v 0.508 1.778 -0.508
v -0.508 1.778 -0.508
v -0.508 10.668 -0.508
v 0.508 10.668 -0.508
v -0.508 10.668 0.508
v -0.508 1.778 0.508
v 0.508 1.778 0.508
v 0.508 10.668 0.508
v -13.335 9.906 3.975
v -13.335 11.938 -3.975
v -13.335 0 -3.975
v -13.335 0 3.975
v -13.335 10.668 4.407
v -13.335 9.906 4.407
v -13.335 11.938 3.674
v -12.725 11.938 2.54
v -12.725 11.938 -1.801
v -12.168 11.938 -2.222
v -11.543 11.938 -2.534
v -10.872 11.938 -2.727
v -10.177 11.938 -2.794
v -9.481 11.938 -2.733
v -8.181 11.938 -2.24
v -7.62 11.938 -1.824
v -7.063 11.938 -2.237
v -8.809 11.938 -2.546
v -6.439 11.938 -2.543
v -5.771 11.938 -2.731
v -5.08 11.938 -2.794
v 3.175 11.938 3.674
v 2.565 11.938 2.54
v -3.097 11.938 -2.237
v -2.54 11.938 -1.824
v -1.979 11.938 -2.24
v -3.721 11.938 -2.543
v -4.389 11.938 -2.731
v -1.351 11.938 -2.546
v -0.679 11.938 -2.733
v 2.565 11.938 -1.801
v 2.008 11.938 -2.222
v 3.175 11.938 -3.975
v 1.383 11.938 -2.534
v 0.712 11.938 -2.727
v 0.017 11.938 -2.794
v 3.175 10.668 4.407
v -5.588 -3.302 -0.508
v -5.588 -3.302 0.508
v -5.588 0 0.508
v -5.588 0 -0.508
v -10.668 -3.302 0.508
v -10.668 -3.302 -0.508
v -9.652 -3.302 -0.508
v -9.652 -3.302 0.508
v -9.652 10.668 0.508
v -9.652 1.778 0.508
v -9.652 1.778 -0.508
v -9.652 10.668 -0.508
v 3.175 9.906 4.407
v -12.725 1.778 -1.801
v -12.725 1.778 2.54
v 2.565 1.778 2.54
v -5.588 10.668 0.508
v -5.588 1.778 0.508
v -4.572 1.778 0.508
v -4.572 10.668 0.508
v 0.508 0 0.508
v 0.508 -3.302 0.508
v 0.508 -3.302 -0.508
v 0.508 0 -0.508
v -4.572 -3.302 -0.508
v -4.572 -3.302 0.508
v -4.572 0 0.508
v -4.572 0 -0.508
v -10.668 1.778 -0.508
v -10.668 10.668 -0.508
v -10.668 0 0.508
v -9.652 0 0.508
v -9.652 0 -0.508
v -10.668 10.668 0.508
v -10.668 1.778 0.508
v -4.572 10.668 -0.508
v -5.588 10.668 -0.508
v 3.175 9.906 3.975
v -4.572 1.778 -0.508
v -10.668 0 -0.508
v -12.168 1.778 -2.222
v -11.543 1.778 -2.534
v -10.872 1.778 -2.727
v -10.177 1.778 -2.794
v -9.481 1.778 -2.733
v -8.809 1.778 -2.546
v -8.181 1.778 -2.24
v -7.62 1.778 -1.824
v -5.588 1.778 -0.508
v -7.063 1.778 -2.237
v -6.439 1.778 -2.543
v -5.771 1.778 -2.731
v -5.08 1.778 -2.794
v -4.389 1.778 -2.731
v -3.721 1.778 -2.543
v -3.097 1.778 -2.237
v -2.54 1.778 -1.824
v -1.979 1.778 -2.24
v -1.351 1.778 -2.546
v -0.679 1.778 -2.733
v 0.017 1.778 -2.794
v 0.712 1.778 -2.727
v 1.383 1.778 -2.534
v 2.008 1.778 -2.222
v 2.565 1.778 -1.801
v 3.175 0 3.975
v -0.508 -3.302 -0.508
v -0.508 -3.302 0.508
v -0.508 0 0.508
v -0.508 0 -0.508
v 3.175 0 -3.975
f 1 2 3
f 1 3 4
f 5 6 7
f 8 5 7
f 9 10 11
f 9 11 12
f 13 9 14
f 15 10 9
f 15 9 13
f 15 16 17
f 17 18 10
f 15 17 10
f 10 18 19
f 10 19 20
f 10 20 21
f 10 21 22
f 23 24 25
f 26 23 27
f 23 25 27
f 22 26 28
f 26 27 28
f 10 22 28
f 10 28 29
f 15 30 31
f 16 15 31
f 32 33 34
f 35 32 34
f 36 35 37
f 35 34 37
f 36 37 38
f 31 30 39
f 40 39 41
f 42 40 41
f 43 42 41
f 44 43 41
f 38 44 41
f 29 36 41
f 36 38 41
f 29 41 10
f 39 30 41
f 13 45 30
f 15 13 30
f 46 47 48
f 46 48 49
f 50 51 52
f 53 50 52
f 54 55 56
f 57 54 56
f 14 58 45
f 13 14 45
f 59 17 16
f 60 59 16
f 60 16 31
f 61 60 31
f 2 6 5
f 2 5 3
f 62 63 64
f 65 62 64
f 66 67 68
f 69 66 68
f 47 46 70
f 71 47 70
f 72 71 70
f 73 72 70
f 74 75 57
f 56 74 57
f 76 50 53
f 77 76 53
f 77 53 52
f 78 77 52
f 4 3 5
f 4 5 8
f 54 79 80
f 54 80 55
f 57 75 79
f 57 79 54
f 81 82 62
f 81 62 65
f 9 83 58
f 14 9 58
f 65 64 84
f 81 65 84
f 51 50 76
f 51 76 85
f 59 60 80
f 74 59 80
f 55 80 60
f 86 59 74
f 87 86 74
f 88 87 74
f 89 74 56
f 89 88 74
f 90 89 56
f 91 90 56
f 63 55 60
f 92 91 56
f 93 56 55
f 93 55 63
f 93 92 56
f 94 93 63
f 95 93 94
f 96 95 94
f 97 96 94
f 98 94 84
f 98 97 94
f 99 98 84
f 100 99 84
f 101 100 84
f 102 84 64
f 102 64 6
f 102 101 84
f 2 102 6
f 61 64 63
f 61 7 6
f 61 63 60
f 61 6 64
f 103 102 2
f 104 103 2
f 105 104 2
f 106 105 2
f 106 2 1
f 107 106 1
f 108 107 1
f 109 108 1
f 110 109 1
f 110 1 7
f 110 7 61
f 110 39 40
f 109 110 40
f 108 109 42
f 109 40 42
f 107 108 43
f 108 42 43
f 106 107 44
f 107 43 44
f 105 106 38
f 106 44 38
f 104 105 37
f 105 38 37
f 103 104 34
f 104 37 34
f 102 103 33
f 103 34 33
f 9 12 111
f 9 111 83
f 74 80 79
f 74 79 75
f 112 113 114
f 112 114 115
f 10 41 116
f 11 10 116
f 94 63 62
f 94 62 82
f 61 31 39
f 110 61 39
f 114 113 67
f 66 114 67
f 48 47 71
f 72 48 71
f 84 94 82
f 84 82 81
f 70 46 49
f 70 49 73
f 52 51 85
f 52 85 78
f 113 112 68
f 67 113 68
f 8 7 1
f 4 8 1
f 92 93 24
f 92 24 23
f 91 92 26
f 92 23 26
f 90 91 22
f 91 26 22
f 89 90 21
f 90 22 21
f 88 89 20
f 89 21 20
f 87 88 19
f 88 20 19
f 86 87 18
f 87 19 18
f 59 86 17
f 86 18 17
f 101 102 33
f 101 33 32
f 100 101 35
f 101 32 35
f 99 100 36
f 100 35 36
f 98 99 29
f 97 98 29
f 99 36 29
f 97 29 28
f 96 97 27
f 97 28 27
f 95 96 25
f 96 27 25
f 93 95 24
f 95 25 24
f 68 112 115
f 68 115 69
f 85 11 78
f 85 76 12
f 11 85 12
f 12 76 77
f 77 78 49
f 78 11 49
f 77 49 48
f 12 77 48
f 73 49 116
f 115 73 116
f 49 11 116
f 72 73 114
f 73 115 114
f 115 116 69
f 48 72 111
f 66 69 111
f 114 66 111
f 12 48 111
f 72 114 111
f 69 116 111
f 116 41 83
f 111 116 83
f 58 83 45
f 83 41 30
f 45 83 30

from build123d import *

# Parameters (mm, degrees)
EXTRUDE1_DEPTH     = 16.51
CUT_EXTRUDE1_DEPTH = 10.16
EXTRUDE2_START     = -3.302
SKETCH2_W          = 1.016
SKETCH2_H          = 1.016
EXTRUDE2_DEPTH     = 13.97
LPATTERN1_COUNT    = 3
LPATTERN1_PITCH    = 5.08


with BuildPart() as part:
    # Sketch1 → Extrude1 (new body)
    with BuildSketch(Plane(origin=(3.175, 0, 0), x_dir=(0, 0, -1), z_dir=(1, 0, 0))):
        Polygon((-3.9751, 0), (-3.9751, 9.906), (-4.4069, 9.906), (-4.4069, 10.668), (-3.673665158, 11.938), (3.9751, 11.938), (3.9751, 0), align=None)
    extrude(amount=-EXTRUDE1_DEPTH)

    # Sketch3 → Cut-Extrude1 (cut)
    with BuildSketch(Plane(origin=(0, 11.938, 0), x_dir=(1, 0, 0), z_dir=(0, 1, 0))):
        with BuildLine():
            Line((-2.5654, 1.800881758), (-2.5654, -2.54))
            Line((-2.5654, -2.54), (2.5654, -2.54))
            Line((2.5654, -2.54), (2.5654, 1.800881758))
            ThreePointArc((2.5654, 1.800881758), (0, 2.794), (-2.5654, 1.800881758))
        make_face()
    cut_extrude1 = extrude(amount=-CUT_EXTRUDE1_DEPTH, mode=Mode.SUBTRACT)

    # Sketch2 → Extrude2 (add)
    with BuildSketch(Plane(origin=(0, 0, 0), x_dir=(1, 0, 0), z_dir=(0, 1, 0)).offset(EXTRUDE2_START)):
        Rectangle(SKETCH2_W, SKETCH2_H)
    extrude2 = extrude(amount=EXTRUDE2_DEPTH)

    # LPattern1: Cut-Extrude1, Extrude2 ×3
    with Locations(*[(-i * LPATTERN1_PITCH, 0, 0) for i in range(1, LPATTERN1_COUNT)]):
        add(cut_extrude1, mode=Mode.SUBTRACT)
        add(extrude2)


solid = part.part
